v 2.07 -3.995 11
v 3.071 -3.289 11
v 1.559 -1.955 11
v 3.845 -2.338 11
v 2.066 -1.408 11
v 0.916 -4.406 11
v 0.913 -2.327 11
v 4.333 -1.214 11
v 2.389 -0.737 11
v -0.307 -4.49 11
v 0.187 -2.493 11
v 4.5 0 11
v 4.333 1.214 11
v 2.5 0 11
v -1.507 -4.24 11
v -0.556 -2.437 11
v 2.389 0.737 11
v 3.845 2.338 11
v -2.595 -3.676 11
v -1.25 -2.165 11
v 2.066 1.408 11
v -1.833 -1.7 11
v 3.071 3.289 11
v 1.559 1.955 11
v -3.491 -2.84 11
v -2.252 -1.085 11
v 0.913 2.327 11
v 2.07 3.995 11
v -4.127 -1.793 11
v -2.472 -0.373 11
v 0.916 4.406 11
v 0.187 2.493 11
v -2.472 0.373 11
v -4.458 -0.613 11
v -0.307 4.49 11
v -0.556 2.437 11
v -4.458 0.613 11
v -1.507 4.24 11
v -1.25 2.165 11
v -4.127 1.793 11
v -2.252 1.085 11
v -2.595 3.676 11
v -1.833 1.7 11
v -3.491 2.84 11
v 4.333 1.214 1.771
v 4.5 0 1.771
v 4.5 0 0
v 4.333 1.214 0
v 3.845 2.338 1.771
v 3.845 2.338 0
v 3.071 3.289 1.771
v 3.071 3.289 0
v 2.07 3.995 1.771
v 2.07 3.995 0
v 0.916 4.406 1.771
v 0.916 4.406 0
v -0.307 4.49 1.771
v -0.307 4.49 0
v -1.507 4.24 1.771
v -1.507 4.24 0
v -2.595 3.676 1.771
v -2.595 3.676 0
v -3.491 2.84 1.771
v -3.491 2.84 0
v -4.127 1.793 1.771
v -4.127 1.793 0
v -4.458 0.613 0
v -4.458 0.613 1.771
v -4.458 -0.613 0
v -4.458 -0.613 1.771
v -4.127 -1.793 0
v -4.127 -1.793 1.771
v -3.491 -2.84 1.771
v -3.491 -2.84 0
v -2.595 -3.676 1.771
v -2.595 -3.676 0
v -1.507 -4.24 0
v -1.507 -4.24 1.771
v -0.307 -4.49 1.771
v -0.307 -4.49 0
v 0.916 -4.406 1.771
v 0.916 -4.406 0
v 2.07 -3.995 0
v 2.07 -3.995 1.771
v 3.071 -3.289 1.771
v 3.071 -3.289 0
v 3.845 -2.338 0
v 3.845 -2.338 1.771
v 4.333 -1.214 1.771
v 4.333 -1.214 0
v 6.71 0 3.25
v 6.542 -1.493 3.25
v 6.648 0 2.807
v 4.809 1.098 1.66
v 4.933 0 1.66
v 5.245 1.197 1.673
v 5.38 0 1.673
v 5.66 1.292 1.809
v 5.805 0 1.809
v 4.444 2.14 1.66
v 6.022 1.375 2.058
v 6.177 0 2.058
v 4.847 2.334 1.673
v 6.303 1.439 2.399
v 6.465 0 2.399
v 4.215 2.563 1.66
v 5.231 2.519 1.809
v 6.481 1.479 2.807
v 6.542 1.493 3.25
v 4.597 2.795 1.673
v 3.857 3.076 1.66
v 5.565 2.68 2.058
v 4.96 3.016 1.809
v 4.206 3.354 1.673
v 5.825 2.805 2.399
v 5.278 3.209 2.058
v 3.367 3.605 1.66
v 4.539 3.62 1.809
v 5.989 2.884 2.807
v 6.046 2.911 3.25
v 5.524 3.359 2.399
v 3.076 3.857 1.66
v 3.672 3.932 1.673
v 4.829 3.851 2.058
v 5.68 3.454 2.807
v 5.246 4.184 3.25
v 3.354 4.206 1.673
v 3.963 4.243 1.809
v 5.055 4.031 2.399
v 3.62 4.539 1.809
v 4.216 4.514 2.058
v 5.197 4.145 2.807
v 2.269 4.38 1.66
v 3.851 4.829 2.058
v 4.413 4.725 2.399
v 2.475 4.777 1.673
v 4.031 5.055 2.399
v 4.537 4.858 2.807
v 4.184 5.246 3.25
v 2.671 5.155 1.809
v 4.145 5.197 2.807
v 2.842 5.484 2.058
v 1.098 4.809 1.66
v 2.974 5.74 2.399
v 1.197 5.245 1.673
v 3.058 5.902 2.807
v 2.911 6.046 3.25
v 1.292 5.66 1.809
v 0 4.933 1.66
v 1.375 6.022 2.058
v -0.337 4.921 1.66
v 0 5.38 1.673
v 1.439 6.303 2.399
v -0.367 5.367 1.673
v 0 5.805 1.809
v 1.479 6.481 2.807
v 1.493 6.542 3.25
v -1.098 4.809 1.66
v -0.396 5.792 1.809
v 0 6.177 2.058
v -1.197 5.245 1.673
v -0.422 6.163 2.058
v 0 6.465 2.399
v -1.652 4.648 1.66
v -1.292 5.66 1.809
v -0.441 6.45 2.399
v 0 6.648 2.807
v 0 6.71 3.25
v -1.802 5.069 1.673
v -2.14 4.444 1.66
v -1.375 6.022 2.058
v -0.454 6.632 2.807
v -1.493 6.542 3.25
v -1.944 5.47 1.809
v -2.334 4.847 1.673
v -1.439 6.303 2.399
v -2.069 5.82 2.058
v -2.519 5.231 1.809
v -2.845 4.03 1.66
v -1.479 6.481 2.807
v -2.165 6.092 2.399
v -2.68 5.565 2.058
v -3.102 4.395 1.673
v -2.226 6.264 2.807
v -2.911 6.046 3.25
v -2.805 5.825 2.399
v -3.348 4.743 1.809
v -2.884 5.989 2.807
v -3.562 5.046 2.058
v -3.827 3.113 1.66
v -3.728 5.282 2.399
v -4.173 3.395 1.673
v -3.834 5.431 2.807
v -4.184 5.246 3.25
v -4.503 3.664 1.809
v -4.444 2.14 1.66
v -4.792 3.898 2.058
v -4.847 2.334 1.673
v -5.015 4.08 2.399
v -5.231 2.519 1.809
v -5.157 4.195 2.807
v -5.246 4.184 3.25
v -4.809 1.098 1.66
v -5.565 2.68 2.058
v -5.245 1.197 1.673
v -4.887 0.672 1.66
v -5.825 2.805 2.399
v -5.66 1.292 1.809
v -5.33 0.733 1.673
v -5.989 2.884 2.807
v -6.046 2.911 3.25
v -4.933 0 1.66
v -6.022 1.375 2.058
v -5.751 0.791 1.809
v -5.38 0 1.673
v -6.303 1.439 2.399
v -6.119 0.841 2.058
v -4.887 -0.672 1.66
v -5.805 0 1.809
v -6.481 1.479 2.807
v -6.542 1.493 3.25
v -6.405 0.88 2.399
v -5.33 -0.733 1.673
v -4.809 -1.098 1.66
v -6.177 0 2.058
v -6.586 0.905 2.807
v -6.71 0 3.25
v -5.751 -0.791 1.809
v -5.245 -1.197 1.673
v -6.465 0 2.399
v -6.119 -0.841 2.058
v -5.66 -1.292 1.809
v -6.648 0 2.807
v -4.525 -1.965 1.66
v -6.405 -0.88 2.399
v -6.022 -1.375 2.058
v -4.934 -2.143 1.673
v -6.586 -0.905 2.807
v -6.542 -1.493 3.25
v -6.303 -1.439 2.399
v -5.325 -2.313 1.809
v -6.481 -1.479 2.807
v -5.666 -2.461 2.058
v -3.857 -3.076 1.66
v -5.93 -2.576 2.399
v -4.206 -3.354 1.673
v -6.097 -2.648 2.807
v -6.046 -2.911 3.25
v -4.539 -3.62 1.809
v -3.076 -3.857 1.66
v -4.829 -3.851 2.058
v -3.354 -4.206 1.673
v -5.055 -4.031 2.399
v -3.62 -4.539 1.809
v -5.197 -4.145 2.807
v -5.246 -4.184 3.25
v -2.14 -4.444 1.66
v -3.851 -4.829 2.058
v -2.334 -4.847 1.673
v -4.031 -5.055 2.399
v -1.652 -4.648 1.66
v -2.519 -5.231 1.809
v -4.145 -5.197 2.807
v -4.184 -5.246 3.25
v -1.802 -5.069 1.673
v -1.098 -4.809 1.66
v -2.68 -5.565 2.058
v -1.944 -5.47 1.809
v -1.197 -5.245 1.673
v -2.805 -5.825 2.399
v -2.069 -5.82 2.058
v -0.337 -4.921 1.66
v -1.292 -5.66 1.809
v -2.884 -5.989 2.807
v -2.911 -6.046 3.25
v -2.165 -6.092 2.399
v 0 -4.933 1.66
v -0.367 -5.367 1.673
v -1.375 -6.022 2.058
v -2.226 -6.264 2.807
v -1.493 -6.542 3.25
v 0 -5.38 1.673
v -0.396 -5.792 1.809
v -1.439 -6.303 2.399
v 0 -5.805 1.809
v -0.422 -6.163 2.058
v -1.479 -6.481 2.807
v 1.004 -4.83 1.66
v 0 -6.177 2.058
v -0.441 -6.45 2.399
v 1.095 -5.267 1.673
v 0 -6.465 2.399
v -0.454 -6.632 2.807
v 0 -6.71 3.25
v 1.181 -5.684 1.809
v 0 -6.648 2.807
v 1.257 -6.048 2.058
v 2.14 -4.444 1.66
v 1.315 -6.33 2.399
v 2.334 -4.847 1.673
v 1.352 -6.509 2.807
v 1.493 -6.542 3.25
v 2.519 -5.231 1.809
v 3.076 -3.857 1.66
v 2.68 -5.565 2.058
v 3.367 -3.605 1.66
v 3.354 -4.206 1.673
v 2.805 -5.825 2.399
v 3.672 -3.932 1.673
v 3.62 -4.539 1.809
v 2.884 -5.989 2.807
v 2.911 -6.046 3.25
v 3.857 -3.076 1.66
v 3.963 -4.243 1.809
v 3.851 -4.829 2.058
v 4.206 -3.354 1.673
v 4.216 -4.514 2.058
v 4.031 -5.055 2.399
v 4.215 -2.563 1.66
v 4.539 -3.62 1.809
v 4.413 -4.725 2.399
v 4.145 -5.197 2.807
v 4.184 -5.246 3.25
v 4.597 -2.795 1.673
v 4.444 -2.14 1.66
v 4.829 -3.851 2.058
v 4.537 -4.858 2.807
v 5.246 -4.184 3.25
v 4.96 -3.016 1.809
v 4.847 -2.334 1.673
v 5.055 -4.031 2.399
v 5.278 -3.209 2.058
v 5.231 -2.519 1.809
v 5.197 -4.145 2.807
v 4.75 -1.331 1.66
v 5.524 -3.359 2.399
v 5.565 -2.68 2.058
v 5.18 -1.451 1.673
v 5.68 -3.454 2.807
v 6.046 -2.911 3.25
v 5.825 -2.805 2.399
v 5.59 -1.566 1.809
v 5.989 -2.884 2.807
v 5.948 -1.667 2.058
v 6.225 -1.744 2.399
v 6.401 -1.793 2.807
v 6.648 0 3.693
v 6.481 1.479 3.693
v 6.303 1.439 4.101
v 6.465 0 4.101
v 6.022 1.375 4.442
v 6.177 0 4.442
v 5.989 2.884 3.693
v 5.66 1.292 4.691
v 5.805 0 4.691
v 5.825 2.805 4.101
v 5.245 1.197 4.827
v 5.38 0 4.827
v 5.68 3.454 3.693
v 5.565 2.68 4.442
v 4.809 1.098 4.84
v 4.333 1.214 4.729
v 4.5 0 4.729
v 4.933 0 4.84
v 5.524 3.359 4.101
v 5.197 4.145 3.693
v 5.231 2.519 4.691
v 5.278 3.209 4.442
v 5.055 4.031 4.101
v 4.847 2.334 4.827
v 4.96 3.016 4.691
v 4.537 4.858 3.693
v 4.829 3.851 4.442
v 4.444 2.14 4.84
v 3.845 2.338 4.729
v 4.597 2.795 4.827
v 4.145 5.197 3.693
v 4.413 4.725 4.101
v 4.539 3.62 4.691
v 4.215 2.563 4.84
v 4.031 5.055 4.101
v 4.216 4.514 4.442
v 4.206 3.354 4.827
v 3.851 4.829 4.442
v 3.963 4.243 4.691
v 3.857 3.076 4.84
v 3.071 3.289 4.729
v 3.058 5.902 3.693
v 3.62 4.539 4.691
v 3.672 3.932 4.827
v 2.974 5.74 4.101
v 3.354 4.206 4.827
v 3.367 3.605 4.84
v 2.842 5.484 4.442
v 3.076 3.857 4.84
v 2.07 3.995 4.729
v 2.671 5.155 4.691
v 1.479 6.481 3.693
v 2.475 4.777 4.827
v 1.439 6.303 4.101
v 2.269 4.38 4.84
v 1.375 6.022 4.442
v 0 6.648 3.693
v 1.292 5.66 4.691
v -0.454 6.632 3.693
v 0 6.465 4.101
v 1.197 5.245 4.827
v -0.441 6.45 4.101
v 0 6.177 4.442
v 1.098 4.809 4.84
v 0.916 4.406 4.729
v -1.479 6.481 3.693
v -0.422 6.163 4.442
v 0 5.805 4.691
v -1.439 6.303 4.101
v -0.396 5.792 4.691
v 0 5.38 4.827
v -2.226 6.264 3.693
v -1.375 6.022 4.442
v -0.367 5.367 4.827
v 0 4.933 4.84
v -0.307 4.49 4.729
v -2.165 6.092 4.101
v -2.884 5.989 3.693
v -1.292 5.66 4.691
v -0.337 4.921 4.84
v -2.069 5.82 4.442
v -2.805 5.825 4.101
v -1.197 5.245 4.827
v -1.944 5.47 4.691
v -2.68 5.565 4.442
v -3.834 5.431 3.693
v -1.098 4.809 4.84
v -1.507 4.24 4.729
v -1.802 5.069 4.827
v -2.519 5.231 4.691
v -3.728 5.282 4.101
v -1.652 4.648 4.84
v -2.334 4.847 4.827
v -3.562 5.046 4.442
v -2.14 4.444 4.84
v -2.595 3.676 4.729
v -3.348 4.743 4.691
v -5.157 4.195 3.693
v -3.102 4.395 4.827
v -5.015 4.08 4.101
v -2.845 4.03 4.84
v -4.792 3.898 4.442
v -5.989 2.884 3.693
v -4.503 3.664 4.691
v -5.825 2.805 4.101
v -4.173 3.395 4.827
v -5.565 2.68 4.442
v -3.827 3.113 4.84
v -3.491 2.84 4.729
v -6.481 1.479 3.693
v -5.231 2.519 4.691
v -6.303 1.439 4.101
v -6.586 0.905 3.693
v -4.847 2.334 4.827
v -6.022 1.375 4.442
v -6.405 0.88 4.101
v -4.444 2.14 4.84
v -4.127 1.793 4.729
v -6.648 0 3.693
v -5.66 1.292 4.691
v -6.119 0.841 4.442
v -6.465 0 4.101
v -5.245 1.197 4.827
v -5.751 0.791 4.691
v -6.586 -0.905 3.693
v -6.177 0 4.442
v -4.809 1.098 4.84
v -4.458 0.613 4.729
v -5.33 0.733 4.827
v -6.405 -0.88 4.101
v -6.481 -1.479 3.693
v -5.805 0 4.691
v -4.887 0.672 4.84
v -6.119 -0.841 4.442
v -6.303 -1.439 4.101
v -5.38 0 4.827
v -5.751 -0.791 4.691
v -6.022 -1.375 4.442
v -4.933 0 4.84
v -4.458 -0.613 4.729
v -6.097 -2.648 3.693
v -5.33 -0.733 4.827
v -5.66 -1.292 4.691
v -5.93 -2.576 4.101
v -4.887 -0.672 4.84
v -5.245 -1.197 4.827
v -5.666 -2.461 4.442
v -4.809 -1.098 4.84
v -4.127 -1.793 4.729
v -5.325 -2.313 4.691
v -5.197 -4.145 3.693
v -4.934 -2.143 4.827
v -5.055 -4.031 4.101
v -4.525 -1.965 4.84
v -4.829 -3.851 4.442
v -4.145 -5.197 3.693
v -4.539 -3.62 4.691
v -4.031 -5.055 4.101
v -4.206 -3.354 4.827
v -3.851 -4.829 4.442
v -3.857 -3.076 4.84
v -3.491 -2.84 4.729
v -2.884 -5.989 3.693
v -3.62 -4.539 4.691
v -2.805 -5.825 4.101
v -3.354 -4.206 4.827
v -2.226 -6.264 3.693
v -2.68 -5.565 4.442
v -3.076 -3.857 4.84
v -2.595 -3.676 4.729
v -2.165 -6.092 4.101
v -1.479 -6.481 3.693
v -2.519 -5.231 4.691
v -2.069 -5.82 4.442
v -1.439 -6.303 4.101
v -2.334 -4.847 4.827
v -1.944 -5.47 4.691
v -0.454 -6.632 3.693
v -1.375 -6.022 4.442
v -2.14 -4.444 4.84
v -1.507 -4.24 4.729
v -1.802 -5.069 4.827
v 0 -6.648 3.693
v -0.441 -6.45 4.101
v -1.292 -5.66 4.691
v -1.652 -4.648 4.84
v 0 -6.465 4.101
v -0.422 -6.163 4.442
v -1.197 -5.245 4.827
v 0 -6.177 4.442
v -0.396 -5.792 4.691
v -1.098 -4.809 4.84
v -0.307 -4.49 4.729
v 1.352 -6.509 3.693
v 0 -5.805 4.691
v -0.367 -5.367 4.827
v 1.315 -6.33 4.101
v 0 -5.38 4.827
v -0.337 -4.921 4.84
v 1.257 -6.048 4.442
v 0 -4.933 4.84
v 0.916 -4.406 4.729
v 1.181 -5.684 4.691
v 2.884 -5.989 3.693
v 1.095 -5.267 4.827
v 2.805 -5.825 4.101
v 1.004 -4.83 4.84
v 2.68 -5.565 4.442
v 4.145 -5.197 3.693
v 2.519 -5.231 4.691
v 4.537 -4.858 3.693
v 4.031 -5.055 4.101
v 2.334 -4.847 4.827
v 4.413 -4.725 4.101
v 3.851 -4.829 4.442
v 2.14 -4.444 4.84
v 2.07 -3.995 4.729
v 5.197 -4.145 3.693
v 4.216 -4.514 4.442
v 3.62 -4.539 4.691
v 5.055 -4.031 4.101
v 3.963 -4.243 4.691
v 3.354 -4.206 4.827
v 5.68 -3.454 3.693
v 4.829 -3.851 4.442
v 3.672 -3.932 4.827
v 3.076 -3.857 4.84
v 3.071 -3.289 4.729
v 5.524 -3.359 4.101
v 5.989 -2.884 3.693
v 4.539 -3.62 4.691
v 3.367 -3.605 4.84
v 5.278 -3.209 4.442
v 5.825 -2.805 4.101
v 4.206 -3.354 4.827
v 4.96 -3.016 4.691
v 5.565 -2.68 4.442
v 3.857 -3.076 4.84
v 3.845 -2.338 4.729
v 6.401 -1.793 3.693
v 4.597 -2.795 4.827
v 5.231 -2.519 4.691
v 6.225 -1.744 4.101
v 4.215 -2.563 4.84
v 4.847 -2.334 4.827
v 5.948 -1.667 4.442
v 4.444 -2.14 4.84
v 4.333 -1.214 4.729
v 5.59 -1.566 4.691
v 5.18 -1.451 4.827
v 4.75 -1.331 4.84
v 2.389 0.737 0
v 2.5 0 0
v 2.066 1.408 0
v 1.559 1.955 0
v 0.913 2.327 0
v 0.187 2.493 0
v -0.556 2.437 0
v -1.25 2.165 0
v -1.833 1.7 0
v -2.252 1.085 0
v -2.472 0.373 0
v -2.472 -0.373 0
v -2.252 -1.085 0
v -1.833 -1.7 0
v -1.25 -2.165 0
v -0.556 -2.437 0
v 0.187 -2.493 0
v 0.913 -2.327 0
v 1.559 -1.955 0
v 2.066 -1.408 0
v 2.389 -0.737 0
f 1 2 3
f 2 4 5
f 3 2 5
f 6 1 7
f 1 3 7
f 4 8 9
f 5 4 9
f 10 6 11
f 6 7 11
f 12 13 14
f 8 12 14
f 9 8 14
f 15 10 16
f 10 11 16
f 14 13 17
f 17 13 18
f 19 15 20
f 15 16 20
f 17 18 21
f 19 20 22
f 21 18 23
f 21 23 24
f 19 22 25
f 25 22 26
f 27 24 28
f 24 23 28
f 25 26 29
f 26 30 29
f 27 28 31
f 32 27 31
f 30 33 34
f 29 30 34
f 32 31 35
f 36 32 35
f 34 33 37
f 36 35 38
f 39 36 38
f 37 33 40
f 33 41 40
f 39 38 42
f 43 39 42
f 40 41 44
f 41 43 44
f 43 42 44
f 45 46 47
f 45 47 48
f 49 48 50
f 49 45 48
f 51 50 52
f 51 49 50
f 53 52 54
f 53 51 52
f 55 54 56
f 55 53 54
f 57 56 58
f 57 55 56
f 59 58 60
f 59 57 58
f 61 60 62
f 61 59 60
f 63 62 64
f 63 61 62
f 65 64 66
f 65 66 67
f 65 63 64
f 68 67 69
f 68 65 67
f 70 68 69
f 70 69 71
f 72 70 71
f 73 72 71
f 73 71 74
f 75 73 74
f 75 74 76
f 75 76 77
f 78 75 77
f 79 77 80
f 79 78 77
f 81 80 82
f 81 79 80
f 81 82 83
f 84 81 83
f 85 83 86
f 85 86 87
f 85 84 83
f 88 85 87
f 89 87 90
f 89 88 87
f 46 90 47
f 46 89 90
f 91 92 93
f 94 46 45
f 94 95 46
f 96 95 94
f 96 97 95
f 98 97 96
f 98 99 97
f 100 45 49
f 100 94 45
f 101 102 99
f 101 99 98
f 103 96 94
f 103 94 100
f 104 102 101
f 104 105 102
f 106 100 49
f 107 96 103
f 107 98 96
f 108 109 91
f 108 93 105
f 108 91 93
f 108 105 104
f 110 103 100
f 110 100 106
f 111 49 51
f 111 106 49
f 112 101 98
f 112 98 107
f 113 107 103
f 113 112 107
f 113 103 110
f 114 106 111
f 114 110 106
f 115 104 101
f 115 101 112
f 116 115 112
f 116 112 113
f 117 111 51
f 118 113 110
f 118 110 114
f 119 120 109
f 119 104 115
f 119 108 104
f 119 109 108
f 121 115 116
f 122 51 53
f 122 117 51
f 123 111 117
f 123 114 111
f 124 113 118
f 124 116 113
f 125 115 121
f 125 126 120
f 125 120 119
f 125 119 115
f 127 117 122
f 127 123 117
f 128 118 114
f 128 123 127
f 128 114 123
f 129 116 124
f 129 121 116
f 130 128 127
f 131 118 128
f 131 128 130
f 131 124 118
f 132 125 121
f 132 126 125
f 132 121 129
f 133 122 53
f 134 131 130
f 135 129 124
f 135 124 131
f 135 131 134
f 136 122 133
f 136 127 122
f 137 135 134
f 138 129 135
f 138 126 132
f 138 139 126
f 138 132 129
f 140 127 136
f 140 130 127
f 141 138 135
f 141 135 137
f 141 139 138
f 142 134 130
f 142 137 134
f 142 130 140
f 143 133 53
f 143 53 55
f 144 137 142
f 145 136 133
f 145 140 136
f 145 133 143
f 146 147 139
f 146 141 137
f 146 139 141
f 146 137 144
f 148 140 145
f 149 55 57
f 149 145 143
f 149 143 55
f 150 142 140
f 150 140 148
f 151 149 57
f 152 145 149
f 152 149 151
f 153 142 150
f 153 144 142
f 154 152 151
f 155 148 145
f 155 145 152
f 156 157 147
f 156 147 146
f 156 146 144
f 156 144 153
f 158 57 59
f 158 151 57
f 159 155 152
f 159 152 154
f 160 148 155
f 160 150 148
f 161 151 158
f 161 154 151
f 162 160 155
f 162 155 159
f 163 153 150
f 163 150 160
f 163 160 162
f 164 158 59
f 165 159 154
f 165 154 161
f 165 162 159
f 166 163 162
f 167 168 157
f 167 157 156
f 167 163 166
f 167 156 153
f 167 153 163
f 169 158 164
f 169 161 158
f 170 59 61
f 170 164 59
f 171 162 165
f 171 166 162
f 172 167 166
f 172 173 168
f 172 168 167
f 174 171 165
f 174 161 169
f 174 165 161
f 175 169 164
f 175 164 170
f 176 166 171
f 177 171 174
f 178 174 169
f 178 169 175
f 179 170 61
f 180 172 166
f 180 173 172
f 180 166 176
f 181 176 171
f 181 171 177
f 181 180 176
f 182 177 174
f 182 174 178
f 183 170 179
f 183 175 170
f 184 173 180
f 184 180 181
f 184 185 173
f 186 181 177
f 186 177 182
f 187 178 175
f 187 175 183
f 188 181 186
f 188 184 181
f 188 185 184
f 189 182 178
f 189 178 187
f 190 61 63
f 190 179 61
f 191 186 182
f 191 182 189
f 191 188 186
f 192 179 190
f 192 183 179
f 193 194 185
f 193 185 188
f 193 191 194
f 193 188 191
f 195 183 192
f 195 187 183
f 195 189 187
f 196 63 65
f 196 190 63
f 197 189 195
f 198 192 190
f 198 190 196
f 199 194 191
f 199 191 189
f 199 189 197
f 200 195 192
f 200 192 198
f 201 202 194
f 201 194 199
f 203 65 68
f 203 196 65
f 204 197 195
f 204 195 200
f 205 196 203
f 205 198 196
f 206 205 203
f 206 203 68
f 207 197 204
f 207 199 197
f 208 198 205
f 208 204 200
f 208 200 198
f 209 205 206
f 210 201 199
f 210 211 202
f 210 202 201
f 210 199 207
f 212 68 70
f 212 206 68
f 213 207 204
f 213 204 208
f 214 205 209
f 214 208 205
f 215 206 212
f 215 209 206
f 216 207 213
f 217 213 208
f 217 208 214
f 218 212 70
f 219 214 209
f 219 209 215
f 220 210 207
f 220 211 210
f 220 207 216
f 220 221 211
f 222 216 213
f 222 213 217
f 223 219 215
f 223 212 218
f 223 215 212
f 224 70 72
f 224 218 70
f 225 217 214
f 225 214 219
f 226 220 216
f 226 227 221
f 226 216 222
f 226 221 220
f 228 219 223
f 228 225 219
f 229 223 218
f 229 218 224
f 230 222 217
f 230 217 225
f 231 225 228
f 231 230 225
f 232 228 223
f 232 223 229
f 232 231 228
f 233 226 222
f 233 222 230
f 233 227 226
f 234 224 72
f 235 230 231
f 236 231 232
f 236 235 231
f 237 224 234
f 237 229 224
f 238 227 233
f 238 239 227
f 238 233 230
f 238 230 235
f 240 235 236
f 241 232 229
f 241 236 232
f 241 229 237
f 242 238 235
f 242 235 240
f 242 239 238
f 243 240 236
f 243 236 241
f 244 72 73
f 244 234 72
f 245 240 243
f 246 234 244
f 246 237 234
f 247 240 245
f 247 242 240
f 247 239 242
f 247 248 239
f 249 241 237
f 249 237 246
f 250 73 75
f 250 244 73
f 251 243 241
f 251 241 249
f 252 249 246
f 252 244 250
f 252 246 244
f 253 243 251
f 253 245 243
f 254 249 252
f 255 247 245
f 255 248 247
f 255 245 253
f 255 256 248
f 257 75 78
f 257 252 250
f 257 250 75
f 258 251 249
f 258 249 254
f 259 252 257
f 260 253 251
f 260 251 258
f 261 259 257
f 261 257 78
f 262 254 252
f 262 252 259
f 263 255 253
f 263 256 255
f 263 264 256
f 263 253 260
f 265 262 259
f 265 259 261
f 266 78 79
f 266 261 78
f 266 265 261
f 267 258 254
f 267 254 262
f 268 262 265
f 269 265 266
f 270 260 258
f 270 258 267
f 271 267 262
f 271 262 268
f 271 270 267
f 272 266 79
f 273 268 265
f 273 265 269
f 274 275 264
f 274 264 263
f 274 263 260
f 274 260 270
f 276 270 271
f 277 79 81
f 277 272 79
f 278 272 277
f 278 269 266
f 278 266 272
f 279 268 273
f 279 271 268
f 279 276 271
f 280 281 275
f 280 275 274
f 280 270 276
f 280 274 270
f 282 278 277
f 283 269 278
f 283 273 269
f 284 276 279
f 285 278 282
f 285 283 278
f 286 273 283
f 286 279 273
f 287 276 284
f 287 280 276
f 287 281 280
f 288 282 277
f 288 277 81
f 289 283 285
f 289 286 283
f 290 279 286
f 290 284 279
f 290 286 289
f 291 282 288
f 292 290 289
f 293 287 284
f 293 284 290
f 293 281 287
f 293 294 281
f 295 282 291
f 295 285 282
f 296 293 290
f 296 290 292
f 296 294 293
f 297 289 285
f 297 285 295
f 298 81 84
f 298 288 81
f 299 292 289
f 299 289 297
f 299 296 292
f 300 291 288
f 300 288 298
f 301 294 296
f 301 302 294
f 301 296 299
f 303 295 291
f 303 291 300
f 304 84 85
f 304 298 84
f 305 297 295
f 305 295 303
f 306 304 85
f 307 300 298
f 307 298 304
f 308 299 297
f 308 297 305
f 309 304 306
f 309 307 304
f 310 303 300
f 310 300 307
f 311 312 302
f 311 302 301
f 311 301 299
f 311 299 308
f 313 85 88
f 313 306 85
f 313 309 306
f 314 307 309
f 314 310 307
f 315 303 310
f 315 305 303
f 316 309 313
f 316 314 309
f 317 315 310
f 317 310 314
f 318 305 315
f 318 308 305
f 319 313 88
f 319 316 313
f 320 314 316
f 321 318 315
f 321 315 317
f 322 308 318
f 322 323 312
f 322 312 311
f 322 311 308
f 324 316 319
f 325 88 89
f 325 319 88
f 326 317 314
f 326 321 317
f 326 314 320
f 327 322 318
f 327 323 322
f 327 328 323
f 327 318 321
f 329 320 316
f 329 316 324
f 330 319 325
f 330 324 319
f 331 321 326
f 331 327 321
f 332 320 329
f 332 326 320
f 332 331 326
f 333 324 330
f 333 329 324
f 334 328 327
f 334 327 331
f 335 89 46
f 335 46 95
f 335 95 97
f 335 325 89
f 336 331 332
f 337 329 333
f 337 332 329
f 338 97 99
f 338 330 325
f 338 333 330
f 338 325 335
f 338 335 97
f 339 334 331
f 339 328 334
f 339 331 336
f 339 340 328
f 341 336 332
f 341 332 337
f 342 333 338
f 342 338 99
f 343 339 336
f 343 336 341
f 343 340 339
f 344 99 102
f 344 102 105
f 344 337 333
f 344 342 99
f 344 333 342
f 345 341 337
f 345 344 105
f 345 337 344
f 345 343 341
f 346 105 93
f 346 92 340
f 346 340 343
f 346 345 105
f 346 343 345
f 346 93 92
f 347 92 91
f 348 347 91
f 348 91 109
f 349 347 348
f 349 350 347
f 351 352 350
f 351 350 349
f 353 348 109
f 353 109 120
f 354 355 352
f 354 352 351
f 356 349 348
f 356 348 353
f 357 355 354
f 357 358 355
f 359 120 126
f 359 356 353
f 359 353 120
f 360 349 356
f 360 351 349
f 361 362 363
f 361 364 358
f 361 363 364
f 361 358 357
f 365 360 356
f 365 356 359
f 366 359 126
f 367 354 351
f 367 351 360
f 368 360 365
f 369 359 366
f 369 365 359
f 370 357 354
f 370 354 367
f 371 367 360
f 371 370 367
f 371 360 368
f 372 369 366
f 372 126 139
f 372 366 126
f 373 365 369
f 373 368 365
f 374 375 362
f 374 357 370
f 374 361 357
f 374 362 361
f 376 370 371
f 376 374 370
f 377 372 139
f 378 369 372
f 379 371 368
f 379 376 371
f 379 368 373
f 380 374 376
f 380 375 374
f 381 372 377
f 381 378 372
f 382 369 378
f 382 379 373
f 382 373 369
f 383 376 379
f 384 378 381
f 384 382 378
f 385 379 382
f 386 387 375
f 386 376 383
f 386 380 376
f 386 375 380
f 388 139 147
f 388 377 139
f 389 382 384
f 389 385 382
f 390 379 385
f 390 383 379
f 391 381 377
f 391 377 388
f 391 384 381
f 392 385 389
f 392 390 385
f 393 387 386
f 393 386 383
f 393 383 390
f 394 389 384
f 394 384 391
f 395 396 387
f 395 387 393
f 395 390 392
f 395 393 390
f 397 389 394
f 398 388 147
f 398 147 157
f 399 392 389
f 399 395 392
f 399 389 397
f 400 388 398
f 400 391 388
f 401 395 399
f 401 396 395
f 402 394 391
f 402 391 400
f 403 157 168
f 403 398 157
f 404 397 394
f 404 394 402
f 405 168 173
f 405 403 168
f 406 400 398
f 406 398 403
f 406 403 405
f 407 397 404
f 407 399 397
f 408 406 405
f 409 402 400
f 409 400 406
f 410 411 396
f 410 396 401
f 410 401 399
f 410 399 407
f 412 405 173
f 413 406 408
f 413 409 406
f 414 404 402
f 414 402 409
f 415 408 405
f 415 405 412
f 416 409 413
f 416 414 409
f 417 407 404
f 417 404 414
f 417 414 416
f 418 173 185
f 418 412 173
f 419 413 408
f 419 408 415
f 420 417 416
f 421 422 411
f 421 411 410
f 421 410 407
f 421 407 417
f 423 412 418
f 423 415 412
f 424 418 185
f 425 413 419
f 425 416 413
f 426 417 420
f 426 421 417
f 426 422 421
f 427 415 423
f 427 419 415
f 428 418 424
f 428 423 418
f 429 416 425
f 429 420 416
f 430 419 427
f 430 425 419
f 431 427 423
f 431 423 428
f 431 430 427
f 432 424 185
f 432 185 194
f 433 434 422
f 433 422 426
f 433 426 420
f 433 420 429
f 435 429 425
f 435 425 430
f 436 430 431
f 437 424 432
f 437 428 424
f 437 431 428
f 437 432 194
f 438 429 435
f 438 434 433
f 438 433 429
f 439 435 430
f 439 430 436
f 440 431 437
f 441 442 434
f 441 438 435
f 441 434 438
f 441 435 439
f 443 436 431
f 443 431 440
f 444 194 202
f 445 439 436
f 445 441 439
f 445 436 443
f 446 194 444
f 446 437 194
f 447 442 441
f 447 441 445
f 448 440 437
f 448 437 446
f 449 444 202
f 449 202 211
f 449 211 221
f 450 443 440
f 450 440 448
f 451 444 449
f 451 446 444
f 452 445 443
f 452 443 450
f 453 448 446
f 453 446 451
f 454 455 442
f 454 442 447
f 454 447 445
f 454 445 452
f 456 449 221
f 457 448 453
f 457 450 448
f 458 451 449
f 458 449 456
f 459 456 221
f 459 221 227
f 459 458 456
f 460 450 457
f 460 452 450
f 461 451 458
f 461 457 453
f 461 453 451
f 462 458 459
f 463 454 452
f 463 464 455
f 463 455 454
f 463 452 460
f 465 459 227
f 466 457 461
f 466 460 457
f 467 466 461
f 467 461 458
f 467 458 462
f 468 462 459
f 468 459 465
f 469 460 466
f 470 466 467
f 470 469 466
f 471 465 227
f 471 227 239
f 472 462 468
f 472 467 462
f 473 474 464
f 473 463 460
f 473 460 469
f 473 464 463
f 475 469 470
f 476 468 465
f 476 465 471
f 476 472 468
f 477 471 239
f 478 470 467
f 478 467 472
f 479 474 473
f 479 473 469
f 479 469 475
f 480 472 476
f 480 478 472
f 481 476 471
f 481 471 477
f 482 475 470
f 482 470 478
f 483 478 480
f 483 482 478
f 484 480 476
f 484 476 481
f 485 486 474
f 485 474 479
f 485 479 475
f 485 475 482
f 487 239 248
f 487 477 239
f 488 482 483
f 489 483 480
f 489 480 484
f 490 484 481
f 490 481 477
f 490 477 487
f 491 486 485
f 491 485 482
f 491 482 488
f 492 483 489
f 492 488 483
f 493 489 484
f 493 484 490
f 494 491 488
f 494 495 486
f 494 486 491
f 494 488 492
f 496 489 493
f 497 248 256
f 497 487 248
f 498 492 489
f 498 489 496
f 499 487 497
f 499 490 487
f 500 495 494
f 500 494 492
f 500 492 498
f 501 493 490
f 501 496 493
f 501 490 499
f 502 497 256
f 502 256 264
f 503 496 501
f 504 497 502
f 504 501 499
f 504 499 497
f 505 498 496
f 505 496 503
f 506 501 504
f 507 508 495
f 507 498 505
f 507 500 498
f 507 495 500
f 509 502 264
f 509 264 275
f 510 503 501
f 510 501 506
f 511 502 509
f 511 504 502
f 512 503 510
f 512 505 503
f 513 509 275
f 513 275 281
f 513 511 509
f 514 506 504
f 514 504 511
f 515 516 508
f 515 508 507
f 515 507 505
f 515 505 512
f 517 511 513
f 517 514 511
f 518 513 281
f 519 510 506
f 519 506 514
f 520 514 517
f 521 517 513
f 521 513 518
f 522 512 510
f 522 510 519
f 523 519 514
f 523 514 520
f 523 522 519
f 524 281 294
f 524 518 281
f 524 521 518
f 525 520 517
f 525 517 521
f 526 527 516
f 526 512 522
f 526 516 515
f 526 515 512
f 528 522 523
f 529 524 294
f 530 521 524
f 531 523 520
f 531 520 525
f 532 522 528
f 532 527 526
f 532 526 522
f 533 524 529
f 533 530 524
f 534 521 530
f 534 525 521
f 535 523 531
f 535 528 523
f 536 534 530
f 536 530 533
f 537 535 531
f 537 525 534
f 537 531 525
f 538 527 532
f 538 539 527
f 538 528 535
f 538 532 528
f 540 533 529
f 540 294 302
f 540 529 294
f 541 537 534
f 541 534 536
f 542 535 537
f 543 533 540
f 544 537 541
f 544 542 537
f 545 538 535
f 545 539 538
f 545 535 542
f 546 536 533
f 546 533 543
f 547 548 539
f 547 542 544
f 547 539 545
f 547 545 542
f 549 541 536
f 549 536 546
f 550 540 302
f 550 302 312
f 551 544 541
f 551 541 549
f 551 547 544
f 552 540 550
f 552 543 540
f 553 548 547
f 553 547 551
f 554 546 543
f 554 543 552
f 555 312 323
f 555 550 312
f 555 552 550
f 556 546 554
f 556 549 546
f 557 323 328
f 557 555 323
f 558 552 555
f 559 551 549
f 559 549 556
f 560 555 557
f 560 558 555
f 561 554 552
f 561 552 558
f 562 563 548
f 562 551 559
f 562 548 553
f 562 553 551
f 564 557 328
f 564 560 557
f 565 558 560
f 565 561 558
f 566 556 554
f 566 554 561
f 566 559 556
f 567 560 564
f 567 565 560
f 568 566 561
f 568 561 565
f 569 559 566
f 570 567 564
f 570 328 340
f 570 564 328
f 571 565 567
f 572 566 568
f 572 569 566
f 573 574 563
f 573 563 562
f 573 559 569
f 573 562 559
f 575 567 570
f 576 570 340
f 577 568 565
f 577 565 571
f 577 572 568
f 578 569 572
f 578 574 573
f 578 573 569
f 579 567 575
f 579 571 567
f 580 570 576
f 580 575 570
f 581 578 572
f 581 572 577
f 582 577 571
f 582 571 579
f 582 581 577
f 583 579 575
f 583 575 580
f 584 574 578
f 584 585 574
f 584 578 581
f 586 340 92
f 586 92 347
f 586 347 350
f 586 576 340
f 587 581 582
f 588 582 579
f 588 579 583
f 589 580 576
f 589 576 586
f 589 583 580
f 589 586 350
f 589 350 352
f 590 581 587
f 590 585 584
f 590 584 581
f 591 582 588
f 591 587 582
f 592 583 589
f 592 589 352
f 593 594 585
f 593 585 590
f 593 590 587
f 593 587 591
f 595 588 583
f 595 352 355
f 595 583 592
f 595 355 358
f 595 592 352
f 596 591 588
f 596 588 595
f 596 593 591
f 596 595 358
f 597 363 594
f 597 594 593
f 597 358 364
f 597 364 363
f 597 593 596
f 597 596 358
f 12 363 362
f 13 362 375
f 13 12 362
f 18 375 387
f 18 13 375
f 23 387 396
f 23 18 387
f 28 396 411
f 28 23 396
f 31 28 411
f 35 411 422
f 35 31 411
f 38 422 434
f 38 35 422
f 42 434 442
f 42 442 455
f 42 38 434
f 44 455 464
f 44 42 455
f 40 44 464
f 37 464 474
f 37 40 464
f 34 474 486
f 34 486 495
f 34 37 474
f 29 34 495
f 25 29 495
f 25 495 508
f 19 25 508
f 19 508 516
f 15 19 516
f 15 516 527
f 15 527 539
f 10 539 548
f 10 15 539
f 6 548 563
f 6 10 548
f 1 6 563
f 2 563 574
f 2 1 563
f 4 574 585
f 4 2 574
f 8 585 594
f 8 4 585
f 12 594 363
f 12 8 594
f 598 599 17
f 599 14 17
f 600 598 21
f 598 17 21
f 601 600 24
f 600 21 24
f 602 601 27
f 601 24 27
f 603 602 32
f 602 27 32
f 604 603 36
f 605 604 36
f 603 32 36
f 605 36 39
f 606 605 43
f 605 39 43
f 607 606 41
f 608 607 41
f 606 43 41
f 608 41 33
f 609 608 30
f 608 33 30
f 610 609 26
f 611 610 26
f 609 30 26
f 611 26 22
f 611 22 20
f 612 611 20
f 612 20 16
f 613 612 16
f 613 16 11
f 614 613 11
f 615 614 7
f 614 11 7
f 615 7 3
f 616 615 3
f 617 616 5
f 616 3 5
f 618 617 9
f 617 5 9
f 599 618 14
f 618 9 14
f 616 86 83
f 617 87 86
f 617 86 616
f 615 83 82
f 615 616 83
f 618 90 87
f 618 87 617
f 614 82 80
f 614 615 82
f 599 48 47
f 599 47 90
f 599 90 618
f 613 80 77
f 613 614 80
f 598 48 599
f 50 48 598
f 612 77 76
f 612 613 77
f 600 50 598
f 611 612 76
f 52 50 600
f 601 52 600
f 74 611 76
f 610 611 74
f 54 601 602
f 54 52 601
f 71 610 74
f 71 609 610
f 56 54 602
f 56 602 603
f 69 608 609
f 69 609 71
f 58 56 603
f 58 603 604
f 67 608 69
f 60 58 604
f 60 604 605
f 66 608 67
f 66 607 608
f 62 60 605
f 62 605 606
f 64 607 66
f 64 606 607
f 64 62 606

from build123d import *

# Parameters (mm, degrees)
F3_W = 2
F3_H = 11
F1_R = 1.6


with BuildPart() as f0:
    # F3 (on Front) → F0 (revolve)
    with BuildSketch(Plane.XZ):
        with Locations((3.5, 5.5)):
            Rectangle(F3_W, F3_H)
    revolve(axis=Axis((0, 0, 71.798525), (0, 0, 1)))

    # F1 (on Front) → F2 (revolve)
    with BuildSketch(Plane.XZ):
        with Locations((5.11, 3.25)):
            Circle(F1_R)
    revolve(axis=Axis((0, 0, 0), (0, 0, 1)))


solid = f0.part
